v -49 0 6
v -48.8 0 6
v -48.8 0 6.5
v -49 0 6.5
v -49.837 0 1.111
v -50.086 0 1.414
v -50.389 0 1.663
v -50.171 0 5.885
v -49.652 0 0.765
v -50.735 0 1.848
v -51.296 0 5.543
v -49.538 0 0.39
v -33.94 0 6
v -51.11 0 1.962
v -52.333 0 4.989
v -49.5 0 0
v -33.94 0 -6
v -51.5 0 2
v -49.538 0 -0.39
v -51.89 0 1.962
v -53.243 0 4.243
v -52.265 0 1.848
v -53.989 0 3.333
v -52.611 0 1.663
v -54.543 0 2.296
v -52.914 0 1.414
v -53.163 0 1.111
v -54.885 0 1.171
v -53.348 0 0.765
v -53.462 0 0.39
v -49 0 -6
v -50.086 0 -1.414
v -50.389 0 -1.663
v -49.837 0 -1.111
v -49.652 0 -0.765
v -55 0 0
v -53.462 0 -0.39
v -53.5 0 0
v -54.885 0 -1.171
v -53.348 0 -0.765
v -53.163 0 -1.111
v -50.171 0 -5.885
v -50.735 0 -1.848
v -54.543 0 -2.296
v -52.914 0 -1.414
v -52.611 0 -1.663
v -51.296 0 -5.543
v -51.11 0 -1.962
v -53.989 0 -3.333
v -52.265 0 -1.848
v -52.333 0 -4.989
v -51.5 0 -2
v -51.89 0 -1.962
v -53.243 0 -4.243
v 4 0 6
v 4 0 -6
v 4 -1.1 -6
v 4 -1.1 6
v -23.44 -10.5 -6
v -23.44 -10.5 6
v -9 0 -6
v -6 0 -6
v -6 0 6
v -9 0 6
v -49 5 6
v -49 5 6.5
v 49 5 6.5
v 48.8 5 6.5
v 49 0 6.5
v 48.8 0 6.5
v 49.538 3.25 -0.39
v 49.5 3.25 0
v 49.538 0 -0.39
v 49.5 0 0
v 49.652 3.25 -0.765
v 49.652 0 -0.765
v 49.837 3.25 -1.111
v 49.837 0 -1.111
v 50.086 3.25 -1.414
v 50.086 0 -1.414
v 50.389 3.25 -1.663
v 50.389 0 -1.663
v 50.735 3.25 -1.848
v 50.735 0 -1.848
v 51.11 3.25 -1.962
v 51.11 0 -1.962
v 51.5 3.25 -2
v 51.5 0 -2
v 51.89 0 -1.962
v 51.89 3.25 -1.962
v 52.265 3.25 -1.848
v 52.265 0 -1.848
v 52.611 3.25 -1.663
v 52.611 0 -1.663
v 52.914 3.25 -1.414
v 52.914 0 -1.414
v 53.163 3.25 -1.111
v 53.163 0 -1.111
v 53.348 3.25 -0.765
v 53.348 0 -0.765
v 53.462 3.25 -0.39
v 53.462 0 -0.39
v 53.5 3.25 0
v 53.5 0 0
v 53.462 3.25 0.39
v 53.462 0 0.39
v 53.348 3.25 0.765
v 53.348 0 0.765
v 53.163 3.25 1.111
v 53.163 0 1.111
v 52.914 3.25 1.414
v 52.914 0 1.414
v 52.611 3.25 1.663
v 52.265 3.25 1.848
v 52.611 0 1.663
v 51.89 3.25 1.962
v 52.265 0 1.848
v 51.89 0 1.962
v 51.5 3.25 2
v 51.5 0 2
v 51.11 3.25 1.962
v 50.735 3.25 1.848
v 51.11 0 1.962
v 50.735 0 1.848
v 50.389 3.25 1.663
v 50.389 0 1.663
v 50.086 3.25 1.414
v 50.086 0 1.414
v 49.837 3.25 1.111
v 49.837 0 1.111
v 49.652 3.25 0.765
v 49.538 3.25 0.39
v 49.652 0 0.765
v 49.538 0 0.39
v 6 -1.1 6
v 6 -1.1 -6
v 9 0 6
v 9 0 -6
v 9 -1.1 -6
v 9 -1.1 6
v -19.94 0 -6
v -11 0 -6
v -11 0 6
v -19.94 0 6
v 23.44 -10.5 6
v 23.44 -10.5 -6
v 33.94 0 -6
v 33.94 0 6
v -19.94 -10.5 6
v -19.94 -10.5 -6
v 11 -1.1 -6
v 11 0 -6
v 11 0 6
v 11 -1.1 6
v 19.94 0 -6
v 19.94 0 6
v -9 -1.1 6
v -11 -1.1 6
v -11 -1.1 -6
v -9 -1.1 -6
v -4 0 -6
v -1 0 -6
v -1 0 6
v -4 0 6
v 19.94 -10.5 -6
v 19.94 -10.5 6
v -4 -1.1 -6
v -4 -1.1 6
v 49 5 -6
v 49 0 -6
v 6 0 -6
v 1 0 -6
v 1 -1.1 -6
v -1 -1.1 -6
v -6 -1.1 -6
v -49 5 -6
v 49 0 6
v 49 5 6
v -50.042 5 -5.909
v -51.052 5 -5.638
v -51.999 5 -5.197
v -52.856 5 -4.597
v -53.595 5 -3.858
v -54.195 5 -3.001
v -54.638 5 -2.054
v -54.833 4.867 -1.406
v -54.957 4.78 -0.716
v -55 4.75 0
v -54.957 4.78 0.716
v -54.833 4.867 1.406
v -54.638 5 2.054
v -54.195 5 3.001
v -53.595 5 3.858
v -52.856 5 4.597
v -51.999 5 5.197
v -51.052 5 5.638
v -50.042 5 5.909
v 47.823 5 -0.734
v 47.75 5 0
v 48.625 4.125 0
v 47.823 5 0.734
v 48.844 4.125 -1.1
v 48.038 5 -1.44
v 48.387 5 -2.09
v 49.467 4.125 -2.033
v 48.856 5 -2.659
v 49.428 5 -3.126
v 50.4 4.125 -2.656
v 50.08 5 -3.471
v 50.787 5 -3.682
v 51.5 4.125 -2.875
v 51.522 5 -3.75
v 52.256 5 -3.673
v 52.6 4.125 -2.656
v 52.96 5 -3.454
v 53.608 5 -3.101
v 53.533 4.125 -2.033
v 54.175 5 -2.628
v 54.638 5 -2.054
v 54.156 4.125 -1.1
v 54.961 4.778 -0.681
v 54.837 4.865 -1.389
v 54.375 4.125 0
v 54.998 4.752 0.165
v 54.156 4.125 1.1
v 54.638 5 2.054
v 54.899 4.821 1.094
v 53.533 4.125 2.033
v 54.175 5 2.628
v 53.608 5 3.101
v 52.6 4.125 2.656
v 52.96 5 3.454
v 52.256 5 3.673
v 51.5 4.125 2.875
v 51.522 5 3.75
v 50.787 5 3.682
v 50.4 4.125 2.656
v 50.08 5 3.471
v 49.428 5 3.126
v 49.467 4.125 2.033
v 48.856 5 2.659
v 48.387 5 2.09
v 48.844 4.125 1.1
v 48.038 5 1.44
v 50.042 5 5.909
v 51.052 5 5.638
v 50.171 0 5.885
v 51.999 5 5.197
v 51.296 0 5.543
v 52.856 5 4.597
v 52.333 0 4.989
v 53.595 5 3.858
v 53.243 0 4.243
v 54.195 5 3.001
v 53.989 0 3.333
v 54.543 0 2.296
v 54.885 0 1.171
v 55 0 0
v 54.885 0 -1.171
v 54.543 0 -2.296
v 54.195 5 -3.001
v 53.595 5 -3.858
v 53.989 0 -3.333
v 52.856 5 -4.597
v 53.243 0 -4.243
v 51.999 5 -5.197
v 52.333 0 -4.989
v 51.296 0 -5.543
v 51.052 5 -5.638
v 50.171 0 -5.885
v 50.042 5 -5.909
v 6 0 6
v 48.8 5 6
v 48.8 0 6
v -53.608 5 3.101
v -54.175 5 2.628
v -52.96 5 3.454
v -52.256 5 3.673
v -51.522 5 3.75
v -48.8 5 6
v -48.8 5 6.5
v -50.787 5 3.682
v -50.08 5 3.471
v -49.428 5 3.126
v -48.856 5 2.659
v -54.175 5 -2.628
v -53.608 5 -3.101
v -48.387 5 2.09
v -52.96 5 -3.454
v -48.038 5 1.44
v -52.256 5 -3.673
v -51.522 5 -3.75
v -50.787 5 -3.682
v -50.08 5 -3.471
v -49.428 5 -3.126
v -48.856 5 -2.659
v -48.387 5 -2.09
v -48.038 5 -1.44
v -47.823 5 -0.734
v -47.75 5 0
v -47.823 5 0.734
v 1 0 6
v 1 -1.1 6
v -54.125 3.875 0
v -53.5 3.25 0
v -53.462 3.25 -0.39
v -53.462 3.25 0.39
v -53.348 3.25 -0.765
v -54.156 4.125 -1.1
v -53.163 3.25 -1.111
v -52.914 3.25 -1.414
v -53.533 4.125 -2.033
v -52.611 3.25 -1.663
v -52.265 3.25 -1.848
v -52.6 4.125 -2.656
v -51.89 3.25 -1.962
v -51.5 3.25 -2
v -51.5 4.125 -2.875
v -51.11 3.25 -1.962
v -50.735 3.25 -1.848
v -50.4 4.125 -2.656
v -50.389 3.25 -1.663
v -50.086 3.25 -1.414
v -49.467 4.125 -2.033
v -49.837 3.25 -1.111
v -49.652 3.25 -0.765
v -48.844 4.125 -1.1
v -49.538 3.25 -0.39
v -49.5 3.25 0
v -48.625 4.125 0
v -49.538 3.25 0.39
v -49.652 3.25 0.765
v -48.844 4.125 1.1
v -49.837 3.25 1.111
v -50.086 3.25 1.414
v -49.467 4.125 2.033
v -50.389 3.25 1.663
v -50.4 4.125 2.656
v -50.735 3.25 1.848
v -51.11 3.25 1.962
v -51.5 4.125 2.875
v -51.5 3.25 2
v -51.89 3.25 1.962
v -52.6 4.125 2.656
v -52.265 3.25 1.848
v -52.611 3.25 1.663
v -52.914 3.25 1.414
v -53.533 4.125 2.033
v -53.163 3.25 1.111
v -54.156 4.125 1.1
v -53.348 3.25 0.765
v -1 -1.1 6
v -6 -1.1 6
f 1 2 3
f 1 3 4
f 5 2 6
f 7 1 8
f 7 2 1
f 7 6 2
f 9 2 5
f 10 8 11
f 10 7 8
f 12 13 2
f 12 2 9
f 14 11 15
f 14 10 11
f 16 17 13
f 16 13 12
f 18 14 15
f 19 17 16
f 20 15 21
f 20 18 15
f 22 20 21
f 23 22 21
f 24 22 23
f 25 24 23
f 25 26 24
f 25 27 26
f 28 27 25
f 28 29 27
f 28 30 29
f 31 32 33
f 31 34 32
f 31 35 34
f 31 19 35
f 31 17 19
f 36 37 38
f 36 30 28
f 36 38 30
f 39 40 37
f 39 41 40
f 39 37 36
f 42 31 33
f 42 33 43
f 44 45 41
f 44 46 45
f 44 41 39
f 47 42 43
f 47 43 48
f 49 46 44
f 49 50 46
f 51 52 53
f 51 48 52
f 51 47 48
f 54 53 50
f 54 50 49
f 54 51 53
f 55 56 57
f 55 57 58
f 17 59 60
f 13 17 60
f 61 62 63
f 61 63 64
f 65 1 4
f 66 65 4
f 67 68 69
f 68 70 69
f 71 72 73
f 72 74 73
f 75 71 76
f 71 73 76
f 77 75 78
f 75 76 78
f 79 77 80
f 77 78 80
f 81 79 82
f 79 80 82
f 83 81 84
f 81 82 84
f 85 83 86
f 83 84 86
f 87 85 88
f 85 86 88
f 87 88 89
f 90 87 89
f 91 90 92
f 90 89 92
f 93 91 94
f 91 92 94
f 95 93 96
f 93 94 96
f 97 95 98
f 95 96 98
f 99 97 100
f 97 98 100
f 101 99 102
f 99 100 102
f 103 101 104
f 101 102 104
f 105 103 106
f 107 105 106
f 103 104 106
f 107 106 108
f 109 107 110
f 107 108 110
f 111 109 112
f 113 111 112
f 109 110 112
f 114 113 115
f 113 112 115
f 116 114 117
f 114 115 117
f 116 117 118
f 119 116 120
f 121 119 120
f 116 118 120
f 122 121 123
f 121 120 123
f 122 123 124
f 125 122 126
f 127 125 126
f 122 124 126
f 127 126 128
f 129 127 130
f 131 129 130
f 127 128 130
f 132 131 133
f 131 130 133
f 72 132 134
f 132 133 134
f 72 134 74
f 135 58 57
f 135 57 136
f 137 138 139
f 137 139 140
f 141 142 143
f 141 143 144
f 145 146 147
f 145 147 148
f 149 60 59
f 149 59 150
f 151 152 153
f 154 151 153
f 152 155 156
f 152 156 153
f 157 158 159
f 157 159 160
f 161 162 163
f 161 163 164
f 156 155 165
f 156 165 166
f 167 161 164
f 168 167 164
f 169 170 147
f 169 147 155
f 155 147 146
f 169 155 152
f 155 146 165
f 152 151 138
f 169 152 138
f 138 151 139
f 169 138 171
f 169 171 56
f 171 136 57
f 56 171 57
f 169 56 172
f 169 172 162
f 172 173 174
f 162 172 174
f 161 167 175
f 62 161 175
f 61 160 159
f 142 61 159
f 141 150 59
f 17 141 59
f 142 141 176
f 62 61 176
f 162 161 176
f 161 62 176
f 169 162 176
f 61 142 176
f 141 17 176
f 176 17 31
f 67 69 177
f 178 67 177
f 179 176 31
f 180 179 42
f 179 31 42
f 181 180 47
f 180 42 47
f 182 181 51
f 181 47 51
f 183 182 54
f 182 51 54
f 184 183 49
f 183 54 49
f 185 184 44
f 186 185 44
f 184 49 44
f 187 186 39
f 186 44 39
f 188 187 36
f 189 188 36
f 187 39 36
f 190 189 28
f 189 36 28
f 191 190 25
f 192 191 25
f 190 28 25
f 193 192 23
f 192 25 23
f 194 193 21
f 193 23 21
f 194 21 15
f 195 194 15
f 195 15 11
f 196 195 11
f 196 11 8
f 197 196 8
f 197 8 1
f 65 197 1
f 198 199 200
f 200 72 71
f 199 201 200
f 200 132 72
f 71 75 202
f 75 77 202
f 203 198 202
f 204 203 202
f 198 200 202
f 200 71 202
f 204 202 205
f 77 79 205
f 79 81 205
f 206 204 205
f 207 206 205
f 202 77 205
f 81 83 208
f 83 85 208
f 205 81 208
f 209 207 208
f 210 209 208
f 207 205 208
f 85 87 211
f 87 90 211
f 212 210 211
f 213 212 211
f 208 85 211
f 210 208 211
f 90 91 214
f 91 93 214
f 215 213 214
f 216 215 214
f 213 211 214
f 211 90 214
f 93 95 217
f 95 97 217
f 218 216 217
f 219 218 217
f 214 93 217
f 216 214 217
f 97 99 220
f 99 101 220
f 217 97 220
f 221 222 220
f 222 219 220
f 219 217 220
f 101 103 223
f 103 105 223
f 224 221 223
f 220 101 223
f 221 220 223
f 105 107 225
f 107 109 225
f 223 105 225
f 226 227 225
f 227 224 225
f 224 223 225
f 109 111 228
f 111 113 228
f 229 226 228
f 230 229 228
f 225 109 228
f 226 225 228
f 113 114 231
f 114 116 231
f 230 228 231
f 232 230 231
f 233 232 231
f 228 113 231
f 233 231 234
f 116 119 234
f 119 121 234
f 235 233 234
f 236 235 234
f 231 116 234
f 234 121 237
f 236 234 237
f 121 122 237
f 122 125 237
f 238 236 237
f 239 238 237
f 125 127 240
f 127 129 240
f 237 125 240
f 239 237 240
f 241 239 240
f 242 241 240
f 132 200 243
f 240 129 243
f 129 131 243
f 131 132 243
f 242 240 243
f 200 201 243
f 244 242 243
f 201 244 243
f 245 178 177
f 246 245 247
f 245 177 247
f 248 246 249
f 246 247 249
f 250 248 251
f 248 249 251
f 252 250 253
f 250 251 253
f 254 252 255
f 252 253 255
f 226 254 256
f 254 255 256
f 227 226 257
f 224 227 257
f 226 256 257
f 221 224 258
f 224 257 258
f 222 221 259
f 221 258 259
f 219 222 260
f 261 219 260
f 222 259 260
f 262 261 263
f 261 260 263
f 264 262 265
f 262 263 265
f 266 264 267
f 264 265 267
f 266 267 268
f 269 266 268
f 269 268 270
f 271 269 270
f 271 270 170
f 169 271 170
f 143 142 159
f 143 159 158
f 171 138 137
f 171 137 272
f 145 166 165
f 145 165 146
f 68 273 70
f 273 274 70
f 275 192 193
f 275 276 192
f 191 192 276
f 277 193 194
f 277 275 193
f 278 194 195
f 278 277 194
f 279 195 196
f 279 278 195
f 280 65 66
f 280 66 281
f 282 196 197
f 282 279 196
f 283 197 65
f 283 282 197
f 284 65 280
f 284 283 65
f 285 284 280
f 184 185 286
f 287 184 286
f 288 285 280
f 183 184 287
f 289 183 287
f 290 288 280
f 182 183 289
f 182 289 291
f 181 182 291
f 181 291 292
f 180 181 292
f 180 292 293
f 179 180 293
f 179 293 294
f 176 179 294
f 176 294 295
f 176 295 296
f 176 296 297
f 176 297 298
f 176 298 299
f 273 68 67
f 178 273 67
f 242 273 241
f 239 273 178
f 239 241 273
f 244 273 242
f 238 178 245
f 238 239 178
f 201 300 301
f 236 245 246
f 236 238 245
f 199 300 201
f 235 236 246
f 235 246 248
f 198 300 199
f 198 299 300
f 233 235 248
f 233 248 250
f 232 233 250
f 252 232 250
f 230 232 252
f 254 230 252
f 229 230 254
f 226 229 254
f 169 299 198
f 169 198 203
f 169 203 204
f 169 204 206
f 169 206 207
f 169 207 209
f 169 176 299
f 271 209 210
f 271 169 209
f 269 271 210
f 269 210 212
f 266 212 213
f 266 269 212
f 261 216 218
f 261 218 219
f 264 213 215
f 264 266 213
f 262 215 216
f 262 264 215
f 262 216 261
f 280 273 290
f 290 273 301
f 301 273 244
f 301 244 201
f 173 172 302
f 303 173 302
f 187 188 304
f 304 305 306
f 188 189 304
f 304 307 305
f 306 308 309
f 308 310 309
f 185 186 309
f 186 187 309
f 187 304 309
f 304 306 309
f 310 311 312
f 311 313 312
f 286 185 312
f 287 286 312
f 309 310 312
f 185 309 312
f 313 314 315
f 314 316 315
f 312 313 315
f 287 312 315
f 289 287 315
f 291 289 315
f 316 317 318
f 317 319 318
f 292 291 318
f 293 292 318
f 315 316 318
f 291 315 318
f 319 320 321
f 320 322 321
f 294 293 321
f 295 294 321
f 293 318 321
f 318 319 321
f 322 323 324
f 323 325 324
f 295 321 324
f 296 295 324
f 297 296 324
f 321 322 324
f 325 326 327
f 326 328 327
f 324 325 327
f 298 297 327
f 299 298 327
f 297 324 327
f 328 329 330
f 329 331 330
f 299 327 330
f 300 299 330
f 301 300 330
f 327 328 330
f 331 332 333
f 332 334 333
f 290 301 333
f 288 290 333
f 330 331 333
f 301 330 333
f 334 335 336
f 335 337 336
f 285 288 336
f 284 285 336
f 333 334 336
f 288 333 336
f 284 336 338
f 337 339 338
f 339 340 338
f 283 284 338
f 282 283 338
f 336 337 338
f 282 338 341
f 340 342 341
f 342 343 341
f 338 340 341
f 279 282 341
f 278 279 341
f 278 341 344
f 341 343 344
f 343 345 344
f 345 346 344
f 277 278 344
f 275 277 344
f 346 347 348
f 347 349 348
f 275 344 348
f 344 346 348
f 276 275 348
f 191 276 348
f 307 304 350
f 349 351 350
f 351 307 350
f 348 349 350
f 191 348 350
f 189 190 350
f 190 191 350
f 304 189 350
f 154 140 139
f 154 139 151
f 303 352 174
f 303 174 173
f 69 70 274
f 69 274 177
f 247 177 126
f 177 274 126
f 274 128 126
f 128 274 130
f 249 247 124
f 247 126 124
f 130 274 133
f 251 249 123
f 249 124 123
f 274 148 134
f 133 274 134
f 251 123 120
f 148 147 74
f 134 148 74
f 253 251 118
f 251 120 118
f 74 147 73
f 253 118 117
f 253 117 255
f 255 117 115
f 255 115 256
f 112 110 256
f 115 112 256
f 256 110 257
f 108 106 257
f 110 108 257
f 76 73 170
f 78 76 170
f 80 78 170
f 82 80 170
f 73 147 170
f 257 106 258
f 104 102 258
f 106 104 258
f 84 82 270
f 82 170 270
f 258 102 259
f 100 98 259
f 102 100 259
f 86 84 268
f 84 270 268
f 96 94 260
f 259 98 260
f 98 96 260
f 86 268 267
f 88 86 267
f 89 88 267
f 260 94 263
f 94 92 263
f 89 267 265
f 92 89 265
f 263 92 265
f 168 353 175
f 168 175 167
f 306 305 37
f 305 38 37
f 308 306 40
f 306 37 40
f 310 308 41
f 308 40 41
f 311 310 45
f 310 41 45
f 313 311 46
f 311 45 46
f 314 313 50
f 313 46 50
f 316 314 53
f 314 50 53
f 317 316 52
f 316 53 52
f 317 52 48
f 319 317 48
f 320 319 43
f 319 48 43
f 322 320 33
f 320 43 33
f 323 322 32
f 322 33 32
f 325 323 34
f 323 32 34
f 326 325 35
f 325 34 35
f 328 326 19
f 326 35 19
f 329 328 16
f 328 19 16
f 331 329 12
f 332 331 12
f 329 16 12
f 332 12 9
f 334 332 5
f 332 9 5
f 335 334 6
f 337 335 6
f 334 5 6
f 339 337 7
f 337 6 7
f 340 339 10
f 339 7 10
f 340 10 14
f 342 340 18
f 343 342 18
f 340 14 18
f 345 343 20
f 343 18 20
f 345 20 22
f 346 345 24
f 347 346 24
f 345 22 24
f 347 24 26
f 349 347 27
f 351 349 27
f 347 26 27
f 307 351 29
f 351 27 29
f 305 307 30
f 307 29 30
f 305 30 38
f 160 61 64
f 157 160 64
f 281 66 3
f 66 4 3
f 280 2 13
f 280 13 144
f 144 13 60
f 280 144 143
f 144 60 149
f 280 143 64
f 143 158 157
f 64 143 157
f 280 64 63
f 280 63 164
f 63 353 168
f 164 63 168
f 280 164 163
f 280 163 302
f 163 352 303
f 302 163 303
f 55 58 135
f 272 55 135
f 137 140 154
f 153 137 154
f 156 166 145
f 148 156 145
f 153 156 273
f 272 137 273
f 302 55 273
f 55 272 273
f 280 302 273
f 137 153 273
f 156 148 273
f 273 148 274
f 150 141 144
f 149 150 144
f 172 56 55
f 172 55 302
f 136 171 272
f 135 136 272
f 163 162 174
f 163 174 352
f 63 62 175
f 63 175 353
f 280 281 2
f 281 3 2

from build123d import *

# Parameters (mm, degrees)
SKETCH1_R                     = 1.5
BOSS_EXTRUDE1_DEPTH           = 3
SKETCH4_W                     = 3.5
SKETCH4_H                     = 12
BOSS_EXTRUDE3_DEPTH           = 10.5
SKETCH5_W                     = 2
SKETCH5_H                     = 12
BOSS_EXTRUDE4_DEPTH           = 1.1
SKETCH6_W                     = 0.2
SKETCH6_H                     = 3
BOSS_EXTRUDE5_DEPTH           = 0.5
CHAMFER1_SIZE                 = 10.5
SKETCH10_R                    = 1.5
BOSS_EXTRUDE6_DEPTH           = 2
CSK_FOR_M4_SFHCS1_D           = 4
CSK_FOR_M4_SFHCS1_DEPTH       = 30.798278762
CSK_FOR_M4_SFHCS1_CSINK_D     = 7.5
CSK_FOR_M4_SFHCS1_CSINK_ANGLE = 90
CSK_FOR_M4_SFHCS1_TIP         = 1.201721238


with BuildPart() as part:
    # Sketch1 → Boss-Extrude1 (new body)
    with BuildSketch(Plane(origin=(0, 0, 0), x_dir=(1, 0, 0), z_dir=(0, 1, 0))):
        with BuildLine():
            Line((-49, 6), (49, 6))
            ThreePointArc((49, 6), (55, 0), (49, -6))
            Line((49, -6), (-49, -6))
            ThreePointArc((-49, -6), (-55, 0), (-49, 6))
        make_face()
        with Locations(Location((-51.5, 0, 0), (0, 0, 270))):
            Circle(SKETCH1_R, mode=Mode.SUBTRACT)
        with Locations(Location((51.5, 0, 0), (0, 0, 270))):
            Circle(SKETCH1_R, mode=Mode.SUBTRACT)
    extrude(amount=BOSS_EXTRUDE1_DEPTH)

    # Sketch4 → Boss-Extrude3 (add)
    with BuildSketch(Plane.XZ):
        with Locations((-21.690023983, 0)):
            Rectangle(SKETCH4_W, SKETCH4_H)
        with Locations((21.690023983, 0)):
            Rectangle(SKETCH4_W, SKETCH4_H)
    extrude(amount=BOSS_EXTRUDE3_DEPTH)

    # Sketch5 → Boss-Extrude4 (add)
    with BuildSketch(Plane.XZ):
        with Locations((5, 0)):
            Rectangle(SKETCH5_W, SKETCH5_H)
        Rectangle(SKETCH5_W, SKETCH5_H)
        with Locations((10, 0)):
            Rectangle(SKETCH5_W, SKETCH5_H)
        with Locations((-5, 0)):
            Rectangle(SKETCH5_W, SKETCH5_H)
        with Locations((-10, 0)):
            Rectangle(SKETCH5_W, SKETCH5_H)
    extrude(amount=BOSS_EXTRUDE4_DEPTH)

    # Sketch6 → Boss-Extrude5 (add)
    with BuildSketch(Plane.XY.offset(6)):
        with Locations((48.9, 1.5)):
            Rectangle(SKETCH6_W, SKETCH6_H)
        with Locations((-48.9, 1.5)):
            Rectangle(SKETCH6_W, SKETCH6_H)
    extrude(amount=BOSS_EXTRUDE5_DEPTH)

    # Chamfer1
    chamfer1_edges = [part.edges().sort_by_distance(p)[0] for p in [
        (-23.440023983, 0, 0),
        (23.440023983, 0, 0),
    ]]
    chamfer(chamfer1_edges, length=CHAMFER1_SIZE - 0.0001)  # a hair under: the kernel refuses the full size

    # Sketch10 → Boss-Extrude6 (add)
    with BuildSketch(Plane(origin=(0, 3, 0), x_dir=(1, 0, 0), z_dir=(0, 1, 0))):
        with BuildLine():
            Line((-49, -6), (-49, -6.5))
            Line((-49, -6.5), (-48.8, -6.5))
            Line((-48.8, -6.5), (-48.8, -6))
            Line((-48.8, -6), (48.8, -6))
            Line((48.8, -6), (48.8, -6.5))
            Line((48.8, -6.5), (49, -6.5))
            Line((49, -6.5), (49, -6))
            ThreePointArc((49, -6), (55, 0), (49, 6))
            Line((49, 6), (-49, 6))
            ThreePointArc((-49, 6), (-55, 0), (-49, -6))
        make_face()
        with Locations(Location((-51.5, 0, 0), (0, 0, 270))):
            Circle(SKETCH10_R, mode=Mode.SUBTRACT)
        with Locations(Location((51.5, 0, 0), (0, 0, 270))):
            Circle(SKETCH10_R, mode=Mode.SUBTRACT)
    extrude(amount=BOSS_EXTRUDE6_DEPTH)

    # CSK for M4 SFHCS1
    with Locations(Plane(origin=(0, 5, 0), x_dir=(1, 0, 0), z_dir=(0, 1, 0))):
        with Locations((51.5, 0), (-51.5, 0)):
            CounterSinkHole(CSK_FOR_M4_SFHCS1_D / 2, CSK_FOR_M4_SFHCS1_CSINK_D / 2, depth=CSK_FOR_M4_SFHCS1_DEPTH, counter_sink_angle=CSK_FOR_M4_SFHCS1_CSINK_ANGLE)
            with Locations((0, 0, -(CSK_FOR_M4_SFHCS1_DEPTH + CSK_FOR_M4_SFHCS1_TIP / 2))):  # 118° drill point
                Cone(0, CSK_FOR_M4_SFHCS1_D / 2, CSK_FOR_M4_SFHCS1_TIP, mode=Mode.SUBTRACT)


solid = part.part
